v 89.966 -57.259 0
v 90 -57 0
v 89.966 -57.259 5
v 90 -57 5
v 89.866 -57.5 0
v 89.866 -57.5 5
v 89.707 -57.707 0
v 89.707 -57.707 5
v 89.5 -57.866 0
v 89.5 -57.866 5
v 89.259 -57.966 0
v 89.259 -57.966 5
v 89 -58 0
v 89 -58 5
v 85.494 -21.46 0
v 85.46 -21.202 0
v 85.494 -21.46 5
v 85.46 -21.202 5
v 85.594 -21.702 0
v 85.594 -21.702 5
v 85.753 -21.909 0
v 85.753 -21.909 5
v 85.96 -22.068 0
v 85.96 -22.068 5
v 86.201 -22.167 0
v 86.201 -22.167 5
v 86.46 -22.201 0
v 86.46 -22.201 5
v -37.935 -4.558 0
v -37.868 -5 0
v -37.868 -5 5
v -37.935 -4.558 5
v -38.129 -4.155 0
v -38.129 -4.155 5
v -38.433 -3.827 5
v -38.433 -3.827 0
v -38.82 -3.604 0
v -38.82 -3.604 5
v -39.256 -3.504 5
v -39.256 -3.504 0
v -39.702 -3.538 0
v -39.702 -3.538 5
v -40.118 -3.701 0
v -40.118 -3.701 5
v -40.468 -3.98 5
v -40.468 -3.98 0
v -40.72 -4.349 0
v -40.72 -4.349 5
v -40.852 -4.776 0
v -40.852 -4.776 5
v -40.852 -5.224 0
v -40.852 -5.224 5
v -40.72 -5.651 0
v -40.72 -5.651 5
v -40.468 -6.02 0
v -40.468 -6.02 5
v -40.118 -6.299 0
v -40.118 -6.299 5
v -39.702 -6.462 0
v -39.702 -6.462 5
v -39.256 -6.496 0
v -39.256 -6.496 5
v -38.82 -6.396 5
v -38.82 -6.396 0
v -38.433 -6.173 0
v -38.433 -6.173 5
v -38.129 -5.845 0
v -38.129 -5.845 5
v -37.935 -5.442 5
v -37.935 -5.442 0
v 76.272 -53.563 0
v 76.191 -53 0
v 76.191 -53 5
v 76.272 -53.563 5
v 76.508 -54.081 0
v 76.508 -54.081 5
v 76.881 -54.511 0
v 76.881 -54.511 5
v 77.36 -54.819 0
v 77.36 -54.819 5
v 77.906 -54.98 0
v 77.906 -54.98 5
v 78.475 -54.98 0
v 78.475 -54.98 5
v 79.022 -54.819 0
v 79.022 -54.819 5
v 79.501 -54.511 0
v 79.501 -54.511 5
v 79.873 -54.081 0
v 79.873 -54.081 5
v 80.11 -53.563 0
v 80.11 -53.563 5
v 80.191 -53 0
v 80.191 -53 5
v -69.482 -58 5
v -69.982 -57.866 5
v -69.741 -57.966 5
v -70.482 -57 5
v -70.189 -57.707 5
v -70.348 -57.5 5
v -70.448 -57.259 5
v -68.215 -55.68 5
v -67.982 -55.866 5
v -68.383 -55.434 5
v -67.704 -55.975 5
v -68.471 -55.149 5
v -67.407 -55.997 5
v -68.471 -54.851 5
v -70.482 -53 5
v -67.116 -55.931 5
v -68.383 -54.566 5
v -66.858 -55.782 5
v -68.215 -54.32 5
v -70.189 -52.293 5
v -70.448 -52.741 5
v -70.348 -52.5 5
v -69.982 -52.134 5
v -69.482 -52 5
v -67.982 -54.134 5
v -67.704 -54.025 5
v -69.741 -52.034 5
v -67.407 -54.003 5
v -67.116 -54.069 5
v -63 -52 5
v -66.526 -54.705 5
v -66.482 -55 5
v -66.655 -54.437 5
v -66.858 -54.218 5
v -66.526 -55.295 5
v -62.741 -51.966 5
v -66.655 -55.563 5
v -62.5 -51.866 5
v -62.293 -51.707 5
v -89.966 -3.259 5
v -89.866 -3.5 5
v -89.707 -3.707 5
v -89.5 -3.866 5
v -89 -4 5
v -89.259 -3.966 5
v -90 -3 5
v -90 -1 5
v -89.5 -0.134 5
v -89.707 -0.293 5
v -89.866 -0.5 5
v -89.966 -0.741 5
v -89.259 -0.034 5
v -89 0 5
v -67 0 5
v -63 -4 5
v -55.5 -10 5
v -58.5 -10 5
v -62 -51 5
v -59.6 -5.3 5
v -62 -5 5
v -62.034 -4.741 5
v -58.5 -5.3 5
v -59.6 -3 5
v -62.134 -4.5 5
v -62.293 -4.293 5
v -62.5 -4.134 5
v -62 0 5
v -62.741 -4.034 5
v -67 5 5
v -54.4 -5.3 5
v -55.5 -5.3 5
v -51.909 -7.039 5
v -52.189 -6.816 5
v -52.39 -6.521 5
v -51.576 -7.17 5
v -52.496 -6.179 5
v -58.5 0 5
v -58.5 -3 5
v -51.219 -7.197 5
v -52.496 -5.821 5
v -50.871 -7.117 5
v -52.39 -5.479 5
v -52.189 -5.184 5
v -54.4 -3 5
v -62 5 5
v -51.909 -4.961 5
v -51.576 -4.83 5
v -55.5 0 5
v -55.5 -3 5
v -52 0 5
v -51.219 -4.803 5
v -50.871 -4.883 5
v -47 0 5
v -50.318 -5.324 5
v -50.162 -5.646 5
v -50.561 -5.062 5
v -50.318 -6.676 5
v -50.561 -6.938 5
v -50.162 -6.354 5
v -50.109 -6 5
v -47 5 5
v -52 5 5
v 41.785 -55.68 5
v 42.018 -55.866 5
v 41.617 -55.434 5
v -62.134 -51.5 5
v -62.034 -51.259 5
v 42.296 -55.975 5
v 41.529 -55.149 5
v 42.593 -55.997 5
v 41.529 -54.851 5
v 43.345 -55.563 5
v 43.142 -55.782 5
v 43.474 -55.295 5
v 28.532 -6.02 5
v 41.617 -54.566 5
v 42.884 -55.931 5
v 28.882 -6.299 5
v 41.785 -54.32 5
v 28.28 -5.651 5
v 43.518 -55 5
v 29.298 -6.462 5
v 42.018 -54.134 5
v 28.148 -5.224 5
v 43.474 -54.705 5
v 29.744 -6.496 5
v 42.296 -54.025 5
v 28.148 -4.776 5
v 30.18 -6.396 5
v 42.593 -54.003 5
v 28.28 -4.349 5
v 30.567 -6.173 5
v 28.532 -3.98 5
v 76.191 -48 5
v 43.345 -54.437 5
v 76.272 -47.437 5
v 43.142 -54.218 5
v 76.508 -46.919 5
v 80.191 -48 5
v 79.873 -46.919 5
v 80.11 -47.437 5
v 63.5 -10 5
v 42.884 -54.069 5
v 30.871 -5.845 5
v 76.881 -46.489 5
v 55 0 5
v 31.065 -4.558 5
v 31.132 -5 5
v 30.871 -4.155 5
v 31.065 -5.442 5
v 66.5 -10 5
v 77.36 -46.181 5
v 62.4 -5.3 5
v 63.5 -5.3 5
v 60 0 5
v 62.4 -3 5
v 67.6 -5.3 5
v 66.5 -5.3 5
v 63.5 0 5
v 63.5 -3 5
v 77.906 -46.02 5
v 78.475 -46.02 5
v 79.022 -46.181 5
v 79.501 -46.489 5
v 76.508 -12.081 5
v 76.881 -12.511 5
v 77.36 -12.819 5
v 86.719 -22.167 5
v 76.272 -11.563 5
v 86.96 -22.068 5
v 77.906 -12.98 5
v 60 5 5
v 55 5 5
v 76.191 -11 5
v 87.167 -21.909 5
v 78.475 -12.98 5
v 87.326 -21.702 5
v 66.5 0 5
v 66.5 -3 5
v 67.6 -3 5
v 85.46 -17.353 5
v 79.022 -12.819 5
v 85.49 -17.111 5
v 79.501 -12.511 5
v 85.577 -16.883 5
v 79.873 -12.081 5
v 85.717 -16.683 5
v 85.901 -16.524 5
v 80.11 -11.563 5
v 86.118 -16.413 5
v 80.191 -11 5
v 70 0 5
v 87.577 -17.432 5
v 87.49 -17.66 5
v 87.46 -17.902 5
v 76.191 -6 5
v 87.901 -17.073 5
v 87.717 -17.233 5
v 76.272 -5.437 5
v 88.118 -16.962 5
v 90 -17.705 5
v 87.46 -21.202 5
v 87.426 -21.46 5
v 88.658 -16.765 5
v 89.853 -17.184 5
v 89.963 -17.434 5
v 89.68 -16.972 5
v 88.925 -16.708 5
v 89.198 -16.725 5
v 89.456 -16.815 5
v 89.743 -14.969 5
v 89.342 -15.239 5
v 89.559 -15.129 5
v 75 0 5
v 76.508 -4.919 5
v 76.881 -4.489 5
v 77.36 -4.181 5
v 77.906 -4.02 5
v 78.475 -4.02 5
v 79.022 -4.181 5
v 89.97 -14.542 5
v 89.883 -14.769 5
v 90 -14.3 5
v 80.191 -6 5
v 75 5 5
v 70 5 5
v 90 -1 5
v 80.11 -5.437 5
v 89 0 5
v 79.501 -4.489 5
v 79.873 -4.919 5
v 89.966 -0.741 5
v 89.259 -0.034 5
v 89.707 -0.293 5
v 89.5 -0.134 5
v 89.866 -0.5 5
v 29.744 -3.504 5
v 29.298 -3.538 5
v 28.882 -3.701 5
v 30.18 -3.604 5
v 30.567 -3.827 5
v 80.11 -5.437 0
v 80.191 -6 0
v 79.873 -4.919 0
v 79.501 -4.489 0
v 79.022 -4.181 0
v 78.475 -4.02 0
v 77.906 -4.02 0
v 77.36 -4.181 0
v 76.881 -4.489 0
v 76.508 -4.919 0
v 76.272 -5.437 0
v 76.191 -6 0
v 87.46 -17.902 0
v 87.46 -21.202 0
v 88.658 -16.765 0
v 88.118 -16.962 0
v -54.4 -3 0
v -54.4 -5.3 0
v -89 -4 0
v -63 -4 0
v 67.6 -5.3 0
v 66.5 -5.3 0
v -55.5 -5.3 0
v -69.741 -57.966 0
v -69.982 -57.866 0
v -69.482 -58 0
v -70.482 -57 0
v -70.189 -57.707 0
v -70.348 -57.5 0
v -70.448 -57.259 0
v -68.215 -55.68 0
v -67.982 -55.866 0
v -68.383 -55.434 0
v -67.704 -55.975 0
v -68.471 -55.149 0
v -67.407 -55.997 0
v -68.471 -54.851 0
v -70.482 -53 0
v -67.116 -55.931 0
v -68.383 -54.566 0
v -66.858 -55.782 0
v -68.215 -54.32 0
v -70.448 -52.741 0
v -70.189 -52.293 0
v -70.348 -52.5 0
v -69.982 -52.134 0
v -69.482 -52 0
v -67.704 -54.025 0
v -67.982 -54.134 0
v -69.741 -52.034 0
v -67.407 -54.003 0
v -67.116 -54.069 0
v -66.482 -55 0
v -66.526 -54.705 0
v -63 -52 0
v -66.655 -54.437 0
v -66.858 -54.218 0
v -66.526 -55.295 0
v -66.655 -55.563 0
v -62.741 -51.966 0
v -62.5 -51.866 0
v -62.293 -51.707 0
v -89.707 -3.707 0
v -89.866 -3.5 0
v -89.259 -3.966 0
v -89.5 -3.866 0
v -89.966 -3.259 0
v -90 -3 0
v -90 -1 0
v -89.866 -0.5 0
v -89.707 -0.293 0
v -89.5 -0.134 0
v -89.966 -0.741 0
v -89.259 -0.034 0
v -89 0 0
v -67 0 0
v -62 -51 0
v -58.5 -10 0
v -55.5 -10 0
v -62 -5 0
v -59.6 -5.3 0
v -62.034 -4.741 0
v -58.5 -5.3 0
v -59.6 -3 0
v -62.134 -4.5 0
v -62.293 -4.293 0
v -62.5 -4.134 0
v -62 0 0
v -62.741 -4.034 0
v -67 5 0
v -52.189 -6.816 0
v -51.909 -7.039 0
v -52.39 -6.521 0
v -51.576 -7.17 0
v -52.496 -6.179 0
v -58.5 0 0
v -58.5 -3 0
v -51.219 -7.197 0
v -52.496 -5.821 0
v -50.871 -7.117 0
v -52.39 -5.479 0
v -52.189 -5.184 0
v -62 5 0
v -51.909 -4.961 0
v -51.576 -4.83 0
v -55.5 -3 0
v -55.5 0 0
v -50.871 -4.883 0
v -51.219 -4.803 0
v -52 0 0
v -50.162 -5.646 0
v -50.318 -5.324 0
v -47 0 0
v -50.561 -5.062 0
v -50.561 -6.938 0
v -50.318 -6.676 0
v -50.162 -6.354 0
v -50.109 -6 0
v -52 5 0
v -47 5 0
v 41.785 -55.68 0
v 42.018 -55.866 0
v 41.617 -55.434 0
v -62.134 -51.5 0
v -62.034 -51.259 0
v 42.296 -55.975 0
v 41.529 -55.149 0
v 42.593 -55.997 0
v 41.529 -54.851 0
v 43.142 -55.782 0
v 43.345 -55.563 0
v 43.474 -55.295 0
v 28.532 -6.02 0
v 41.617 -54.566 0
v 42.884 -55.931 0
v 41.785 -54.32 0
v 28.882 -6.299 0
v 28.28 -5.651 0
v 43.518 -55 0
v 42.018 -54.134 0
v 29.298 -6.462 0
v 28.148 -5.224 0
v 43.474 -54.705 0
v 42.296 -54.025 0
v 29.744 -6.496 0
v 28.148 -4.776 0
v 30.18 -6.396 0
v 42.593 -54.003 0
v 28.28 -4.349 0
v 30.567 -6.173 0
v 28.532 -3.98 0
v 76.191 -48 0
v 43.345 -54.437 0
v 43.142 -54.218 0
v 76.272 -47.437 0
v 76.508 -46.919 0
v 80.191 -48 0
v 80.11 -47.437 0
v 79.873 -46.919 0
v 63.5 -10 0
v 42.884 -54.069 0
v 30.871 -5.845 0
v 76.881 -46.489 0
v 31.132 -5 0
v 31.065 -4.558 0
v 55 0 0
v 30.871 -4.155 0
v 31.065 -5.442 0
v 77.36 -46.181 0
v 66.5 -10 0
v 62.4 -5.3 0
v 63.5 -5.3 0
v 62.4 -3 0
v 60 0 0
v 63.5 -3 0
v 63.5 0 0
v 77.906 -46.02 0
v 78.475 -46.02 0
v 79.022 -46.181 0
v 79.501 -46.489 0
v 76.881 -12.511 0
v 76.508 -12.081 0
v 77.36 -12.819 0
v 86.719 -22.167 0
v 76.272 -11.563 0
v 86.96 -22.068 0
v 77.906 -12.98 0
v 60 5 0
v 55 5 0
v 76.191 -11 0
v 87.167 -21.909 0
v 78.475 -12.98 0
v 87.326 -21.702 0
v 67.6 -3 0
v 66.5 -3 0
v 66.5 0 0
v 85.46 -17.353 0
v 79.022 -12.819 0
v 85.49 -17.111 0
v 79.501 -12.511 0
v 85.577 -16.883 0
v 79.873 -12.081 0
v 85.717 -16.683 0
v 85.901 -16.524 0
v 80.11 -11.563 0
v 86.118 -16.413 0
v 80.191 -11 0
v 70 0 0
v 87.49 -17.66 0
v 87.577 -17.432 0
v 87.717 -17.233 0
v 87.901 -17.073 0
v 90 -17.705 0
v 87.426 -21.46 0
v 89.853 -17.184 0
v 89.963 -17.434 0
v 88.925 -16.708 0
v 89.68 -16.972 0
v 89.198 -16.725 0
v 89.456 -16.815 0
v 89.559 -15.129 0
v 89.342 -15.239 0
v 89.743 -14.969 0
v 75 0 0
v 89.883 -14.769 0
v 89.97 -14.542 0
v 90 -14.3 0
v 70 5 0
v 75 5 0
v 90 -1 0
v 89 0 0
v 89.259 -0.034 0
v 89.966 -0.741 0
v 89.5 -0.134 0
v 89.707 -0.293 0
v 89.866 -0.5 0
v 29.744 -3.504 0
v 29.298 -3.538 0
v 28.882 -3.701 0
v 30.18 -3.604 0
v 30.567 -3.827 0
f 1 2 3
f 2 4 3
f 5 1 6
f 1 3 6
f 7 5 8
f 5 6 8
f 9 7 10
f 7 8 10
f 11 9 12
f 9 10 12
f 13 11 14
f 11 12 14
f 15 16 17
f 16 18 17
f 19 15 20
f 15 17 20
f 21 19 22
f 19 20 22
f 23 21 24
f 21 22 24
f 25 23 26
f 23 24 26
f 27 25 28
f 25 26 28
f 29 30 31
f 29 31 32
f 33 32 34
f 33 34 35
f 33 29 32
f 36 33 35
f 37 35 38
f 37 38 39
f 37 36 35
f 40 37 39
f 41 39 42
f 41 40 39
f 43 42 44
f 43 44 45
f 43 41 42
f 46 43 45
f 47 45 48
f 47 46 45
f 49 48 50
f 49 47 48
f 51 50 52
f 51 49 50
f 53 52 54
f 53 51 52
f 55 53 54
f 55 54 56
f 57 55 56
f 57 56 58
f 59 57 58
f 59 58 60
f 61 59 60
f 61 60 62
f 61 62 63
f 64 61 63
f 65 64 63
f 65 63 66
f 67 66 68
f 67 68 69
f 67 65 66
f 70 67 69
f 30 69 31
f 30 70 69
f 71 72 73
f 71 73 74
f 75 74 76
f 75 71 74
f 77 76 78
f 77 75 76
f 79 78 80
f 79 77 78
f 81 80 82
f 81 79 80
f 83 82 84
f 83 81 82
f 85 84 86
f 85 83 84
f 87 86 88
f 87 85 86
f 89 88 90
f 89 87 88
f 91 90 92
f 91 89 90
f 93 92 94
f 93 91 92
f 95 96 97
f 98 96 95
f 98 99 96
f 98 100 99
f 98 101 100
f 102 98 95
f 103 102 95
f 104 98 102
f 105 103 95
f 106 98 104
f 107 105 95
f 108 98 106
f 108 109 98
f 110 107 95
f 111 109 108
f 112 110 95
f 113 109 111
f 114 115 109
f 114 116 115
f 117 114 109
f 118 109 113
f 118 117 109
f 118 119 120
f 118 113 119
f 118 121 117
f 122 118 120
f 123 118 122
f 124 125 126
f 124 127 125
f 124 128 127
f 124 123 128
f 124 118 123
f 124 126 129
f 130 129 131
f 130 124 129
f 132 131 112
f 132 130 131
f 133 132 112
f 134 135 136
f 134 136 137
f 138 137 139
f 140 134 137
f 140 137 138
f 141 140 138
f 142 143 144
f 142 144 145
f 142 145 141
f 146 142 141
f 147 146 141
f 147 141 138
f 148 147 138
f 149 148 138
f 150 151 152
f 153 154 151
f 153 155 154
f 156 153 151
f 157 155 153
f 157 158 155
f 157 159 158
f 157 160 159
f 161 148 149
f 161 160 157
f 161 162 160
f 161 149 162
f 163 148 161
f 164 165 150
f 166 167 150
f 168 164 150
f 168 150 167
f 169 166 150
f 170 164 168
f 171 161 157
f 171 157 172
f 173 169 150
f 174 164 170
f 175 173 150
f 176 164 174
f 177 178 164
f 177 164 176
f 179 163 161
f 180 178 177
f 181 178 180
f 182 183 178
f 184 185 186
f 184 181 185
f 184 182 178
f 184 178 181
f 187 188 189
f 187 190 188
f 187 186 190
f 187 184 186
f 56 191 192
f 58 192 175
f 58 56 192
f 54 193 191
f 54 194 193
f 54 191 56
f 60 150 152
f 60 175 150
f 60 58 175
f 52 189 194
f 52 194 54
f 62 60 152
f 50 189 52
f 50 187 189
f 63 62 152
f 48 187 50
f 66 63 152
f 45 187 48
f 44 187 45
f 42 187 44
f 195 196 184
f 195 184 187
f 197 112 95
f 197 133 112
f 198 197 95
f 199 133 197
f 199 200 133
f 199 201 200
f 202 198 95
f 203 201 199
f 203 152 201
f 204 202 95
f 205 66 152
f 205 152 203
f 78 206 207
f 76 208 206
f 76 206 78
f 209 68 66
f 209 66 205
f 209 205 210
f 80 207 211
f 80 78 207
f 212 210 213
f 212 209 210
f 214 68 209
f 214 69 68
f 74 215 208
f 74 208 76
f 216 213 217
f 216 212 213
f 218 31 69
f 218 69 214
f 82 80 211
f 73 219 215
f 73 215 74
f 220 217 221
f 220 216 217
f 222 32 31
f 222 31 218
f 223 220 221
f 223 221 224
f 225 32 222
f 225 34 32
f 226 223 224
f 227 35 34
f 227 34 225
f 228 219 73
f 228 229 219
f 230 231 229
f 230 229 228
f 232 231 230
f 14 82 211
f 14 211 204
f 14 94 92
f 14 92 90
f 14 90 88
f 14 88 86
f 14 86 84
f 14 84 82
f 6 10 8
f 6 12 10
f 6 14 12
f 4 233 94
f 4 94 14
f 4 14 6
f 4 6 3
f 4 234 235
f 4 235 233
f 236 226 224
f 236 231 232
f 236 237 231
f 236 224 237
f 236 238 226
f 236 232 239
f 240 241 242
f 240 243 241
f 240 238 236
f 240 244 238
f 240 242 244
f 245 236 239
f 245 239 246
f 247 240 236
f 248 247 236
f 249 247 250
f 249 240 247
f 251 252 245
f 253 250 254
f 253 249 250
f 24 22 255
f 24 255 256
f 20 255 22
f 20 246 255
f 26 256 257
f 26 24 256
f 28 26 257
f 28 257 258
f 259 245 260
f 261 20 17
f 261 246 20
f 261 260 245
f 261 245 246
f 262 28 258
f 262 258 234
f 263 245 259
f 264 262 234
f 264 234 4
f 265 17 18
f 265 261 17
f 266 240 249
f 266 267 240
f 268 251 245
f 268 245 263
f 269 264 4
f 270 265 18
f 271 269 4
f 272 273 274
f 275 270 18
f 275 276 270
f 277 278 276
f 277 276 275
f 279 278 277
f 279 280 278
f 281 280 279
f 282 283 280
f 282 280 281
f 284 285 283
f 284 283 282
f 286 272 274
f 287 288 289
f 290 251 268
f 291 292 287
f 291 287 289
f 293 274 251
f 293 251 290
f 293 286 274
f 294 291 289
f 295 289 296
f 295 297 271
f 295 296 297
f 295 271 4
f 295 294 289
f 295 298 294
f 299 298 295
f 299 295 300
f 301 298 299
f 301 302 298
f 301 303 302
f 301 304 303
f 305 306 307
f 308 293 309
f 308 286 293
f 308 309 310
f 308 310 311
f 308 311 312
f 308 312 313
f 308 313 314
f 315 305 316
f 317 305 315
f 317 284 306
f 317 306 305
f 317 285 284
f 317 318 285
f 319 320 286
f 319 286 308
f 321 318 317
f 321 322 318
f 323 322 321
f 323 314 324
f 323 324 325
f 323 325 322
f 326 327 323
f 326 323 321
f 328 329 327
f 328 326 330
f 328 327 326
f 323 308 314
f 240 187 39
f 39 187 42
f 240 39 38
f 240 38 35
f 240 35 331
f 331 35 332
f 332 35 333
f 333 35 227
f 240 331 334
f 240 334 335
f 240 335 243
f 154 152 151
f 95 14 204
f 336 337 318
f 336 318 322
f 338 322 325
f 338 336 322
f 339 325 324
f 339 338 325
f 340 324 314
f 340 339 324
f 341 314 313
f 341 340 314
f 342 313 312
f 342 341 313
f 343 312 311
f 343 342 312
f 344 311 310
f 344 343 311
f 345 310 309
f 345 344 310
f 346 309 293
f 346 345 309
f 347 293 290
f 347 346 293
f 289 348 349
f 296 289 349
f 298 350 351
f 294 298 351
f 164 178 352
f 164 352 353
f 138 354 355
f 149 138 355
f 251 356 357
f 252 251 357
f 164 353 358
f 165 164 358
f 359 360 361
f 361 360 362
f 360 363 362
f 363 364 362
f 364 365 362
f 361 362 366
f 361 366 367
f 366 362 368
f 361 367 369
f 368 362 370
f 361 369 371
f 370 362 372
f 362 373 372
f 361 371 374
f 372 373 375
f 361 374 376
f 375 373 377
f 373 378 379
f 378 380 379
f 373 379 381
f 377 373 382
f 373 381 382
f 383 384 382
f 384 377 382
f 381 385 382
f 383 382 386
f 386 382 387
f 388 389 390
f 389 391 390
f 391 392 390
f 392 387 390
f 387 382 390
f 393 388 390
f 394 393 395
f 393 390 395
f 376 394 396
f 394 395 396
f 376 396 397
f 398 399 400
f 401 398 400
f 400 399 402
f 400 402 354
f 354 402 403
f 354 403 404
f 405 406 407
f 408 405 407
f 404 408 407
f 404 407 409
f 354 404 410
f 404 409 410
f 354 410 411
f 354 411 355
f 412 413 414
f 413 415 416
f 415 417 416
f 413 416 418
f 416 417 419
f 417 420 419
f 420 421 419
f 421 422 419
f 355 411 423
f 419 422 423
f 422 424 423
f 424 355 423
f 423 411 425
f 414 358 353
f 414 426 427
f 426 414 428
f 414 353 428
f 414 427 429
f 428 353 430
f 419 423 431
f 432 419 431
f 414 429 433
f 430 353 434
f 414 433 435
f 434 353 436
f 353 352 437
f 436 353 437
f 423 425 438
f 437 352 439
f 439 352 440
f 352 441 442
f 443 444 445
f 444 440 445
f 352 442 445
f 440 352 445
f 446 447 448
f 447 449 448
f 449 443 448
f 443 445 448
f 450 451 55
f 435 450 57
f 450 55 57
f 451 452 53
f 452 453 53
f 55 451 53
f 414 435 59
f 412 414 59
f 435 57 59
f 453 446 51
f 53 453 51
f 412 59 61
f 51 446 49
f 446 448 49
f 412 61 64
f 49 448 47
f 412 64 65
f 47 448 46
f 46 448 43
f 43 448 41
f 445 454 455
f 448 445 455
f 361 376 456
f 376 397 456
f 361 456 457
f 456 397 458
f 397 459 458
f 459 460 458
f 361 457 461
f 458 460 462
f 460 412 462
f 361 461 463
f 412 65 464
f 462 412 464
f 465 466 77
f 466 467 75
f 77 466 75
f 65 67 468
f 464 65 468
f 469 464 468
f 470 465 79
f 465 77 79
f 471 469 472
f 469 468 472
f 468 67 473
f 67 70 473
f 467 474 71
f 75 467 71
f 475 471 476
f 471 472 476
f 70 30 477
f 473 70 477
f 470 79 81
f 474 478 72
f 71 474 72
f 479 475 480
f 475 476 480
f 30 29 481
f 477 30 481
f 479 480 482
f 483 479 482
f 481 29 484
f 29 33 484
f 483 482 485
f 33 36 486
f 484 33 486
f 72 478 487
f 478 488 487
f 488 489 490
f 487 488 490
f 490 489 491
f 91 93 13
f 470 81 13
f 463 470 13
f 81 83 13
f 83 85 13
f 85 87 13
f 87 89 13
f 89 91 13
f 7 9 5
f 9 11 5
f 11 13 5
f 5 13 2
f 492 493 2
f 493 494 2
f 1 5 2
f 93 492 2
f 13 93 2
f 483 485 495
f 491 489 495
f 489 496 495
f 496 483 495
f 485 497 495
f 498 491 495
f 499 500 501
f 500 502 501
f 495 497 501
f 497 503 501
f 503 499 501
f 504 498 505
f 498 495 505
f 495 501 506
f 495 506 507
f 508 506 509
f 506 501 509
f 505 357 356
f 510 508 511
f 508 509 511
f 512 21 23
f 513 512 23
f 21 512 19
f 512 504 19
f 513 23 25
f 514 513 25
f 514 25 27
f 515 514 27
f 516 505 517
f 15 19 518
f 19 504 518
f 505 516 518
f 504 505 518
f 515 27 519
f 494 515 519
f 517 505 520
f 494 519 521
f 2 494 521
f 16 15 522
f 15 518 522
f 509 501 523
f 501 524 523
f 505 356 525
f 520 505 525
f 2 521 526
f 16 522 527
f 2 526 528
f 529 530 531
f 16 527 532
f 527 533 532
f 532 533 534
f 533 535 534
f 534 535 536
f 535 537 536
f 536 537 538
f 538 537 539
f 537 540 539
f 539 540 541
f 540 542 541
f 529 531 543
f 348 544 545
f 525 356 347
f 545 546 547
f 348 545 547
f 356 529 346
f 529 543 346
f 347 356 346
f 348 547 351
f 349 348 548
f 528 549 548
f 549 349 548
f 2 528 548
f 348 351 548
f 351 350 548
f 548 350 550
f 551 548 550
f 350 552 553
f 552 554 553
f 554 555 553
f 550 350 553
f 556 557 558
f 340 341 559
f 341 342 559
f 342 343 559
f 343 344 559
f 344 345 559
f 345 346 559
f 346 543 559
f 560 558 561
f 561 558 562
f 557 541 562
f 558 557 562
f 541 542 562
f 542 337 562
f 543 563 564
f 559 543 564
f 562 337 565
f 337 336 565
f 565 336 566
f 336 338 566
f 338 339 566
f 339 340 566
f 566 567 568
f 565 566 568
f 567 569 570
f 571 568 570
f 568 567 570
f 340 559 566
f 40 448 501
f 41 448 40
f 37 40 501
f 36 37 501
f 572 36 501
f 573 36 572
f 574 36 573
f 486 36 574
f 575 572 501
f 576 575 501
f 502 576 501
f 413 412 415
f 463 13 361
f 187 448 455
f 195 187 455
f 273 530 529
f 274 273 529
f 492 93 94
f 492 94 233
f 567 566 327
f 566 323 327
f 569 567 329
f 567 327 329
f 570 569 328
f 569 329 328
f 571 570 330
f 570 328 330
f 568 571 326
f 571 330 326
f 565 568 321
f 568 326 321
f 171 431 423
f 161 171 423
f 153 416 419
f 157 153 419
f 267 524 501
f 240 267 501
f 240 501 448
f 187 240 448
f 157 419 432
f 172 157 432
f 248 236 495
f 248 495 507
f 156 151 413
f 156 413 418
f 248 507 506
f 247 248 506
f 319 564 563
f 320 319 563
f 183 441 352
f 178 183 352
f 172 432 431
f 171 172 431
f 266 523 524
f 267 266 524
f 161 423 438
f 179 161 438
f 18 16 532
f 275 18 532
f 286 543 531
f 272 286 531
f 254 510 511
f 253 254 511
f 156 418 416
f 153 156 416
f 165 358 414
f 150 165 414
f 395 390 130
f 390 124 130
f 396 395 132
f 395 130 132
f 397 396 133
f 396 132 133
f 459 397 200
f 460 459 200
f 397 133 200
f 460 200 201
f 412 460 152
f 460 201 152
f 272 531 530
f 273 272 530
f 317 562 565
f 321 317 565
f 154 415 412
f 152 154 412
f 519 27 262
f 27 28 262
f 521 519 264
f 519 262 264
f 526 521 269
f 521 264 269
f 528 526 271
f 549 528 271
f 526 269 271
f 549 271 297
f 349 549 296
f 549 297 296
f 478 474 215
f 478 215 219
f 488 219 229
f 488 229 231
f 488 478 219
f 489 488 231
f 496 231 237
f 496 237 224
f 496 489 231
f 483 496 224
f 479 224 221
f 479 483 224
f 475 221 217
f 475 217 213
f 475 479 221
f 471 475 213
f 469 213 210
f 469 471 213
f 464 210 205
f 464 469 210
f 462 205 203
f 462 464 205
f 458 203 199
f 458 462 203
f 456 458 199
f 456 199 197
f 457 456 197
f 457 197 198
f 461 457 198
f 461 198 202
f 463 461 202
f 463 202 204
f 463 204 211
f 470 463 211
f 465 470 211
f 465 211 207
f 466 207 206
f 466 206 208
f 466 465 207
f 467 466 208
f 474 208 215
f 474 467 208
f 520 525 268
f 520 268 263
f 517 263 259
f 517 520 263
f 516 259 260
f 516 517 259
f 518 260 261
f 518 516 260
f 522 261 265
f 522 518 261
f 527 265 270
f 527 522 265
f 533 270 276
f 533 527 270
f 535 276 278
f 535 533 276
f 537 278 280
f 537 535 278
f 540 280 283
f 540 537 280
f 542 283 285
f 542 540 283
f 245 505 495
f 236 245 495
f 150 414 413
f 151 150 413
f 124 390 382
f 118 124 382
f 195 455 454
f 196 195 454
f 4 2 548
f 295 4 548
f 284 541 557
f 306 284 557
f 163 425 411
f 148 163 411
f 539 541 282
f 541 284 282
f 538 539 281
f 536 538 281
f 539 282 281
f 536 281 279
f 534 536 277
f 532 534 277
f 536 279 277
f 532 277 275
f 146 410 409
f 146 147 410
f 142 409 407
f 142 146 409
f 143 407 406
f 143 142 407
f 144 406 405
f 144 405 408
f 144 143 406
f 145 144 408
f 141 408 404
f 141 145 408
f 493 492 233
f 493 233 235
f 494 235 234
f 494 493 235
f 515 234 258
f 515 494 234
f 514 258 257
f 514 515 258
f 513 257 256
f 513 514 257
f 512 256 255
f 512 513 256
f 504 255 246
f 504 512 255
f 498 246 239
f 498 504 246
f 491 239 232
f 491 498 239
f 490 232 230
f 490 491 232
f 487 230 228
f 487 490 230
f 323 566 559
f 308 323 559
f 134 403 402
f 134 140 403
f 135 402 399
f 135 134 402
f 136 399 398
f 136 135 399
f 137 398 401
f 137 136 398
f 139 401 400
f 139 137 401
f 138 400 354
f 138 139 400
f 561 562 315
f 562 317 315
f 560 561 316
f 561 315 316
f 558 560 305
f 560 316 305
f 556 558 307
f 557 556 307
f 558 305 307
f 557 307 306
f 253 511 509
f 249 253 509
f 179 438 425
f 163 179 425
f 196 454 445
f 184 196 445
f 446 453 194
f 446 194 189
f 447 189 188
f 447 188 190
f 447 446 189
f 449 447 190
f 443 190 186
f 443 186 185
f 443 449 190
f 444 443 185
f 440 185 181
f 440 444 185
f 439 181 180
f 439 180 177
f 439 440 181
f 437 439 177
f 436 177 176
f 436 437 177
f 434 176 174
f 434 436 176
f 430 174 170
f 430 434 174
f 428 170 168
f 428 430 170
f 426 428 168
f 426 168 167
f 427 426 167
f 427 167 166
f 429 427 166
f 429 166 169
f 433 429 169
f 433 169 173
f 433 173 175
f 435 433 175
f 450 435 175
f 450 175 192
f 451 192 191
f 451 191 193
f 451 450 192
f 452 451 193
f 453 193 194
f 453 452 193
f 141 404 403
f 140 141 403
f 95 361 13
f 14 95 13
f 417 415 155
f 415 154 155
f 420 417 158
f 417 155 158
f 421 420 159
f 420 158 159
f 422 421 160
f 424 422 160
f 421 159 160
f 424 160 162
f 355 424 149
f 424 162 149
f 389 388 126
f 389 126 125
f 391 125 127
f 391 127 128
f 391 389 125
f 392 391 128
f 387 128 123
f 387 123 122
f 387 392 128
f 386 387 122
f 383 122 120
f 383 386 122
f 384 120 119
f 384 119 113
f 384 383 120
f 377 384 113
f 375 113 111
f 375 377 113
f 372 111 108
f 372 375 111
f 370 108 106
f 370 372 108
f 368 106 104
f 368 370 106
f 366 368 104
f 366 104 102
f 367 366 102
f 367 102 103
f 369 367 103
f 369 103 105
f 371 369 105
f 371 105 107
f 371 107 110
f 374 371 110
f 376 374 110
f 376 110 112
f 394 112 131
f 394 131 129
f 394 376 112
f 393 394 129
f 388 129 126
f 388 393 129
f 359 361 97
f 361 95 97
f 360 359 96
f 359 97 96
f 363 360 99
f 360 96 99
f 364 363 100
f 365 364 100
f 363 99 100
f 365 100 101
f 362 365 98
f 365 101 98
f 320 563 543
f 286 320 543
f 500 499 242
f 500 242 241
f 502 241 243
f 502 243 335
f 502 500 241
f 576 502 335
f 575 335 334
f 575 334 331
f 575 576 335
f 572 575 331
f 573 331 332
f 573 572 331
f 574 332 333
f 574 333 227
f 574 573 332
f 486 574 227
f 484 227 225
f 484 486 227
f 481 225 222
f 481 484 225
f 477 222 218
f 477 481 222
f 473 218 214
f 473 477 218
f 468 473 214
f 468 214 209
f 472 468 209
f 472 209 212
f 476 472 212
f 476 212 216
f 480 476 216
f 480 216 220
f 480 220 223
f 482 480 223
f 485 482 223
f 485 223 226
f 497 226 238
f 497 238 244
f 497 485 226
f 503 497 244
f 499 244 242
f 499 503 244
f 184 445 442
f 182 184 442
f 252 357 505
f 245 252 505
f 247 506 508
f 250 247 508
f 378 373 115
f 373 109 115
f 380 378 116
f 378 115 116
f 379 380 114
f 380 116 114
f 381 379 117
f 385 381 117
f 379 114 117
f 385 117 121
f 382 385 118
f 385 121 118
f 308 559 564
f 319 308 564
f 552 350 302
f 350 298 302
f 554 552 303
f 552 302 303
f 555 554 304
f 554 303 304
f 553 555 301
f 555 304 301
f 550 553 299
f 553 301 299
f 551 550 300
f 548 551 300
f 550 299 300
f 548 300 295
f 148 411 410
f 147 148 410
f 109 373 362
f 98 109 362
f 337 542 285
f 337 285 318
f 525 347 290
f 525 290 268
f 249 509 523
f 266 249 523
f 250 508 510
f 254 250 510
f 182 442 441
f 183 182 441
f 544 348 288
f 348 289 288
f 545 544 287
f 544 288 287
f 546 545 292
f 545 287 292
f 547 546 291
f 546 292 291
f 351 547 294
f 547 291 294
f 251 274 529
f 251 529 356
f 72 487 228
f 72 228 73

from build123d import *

# Parameters (mm, degrees)
ESQUISSE1_R             = 1
ESQUISSE1_R_2           = 1.2
ESQUISSE1_R_3           = 1.5
BOSS_EXTRU_1_DEPTH      = 5
ENL_V_MAT_EXTRU_1_DEPTH = 108.186752913
CONG_1_R                = 1


with BuildPart() as part:
    # Esquisse1 → Boss.-Extru.1 (new body)
    with BuildSketch(Plane.XY):
        Polygon((-67, 5), (-67, 0), (-90, 0), (-90, -4), (-62, -4), (-62, -52), (-70.4817, -52), (-70.4817, -58), (-62, -58), (90, -58), (90, 0), (75, 0), (75, 5), (70, 5), (70, 0), (66.5, 0), (66.5, -3), (67.6, -3), (67.6, -5.3), (66.5, -5.3), (66.5, -10), (63.5, -10), (63.5, -5.3), (62.4, -5.3), (62.4, -3), (63.5, -3), (63.5, 0), (60, 0), (60, 5), (55, 5), (55, 0), (-47, 0), (-47, 5), (-52, 5), (-52, 0), (-55.5, 0), (-55.5, -3), (-54.4, -3), (-54.4, -5.3), (-55.5, -5.3), (-55.5, -10), (-58.5, -10), (-58.5, -5.3), (-59.6, -5.3), (-59.6, -3), (-58.5, -3), (-58.5, 0), (-62, 0), (-62, 5), align=None)
        with Locations((-67.4817, -55)):
            Circle(ESQUISSE1_R, mode=Mode.SUBTRACT)
        with Locations((42.5183, -55)):
            Circle(ESQUISSE1_R, mode=Mode.SUBTRACT)
        with Locations((-51.30915, -6)):
            Circle(ESQUISSE1_R_2, mode=Mode.SUBTRACT)
        with Locations((-39.3683, -5)):
            Circle(ESQUISSE1_R_3, mode=Mode.SUBTRACT)
        with Locations((29.6317, -5)):
            Circle(ESQUISSE1_R_3, mode=Mode.SUBTRACT)
        with Locations((78.19085, -6)):
            Circle(ESQUISSE1_R_2, mode=Mode.SUBTRACT)
    extrude(amount=BOSS_EXTRU_1_DEPTH)

    # Esquisse2 → Enlèv. mat.-Extru.1 (cut, through all)
    with BuildSketch(Plane(origin=(0, 0, 0), x_dir=(-1, 0, 0), z_dir=(0, 0, -1))):
        Polygon((-90, -16.277013327), (-87.46, -17.201497722), (-87.46, -22.201497722), (-85.46, -22.201497722), (-85.46, -16.652424864), (-90, -15), align=None)
        with BuildLine():
            Line((-76.19085, -6), (-76.19085, -11))
            ThreePointArc((-76.19085, -11), (-78.19085, -13), (-80.19085, -11))
            Line((-80.19085, -11), (-80.19085, -6))
            ThreePointArc((-80.19085, -6), (-78.19085, -4), (-76.19085, -6))
        make_face()
        with BuildLine():
            Line((-76.19085, -48), (-76.19085, -53))
            ThreePointArc((-76.19085, -53), (-78.19085, -55), (-80.19085, -53))
            Line((-80.19085, -53), (-80.19085, -48))
            ThreePointArc((-80.19085, -48), (-78.19085, -46), (-76.19085, -48))
        make_face()
    extrude(amount=-ENL_V_MAT_EXTRU_1_DEPTH, mode=Mode.SUBTRACT)

    # Congé1
    cong_1_edges = [part.edges().sort_by_distance(p)[0] for p in [
        (85.46, -16.652424864, 2.5),
        (90, -15, 2.5),
        (90, -16.277013327, 2.5),
        (87.46, -17.201497722, 2.5),
        (87.46, -22.201497722, 2.5),
        (85.46, -22.201497722, 2.5),
        (90, -58, 2.5),
        (90, 0, 2.5),
        (-90, 0, 2.5),
        (-90, -4, 2.5),
        (-62, -4, 2.5),
        (-62, -52, 2.5),
        (-70.4817, -58, 2.5),
        (-70.4817, -52, 2.5),
    ]]
    fillet(cong_1_edges, radius=CONG_1_R - 0.0001)  # a hair under: the kernel refuses the full size


solid = part.part
